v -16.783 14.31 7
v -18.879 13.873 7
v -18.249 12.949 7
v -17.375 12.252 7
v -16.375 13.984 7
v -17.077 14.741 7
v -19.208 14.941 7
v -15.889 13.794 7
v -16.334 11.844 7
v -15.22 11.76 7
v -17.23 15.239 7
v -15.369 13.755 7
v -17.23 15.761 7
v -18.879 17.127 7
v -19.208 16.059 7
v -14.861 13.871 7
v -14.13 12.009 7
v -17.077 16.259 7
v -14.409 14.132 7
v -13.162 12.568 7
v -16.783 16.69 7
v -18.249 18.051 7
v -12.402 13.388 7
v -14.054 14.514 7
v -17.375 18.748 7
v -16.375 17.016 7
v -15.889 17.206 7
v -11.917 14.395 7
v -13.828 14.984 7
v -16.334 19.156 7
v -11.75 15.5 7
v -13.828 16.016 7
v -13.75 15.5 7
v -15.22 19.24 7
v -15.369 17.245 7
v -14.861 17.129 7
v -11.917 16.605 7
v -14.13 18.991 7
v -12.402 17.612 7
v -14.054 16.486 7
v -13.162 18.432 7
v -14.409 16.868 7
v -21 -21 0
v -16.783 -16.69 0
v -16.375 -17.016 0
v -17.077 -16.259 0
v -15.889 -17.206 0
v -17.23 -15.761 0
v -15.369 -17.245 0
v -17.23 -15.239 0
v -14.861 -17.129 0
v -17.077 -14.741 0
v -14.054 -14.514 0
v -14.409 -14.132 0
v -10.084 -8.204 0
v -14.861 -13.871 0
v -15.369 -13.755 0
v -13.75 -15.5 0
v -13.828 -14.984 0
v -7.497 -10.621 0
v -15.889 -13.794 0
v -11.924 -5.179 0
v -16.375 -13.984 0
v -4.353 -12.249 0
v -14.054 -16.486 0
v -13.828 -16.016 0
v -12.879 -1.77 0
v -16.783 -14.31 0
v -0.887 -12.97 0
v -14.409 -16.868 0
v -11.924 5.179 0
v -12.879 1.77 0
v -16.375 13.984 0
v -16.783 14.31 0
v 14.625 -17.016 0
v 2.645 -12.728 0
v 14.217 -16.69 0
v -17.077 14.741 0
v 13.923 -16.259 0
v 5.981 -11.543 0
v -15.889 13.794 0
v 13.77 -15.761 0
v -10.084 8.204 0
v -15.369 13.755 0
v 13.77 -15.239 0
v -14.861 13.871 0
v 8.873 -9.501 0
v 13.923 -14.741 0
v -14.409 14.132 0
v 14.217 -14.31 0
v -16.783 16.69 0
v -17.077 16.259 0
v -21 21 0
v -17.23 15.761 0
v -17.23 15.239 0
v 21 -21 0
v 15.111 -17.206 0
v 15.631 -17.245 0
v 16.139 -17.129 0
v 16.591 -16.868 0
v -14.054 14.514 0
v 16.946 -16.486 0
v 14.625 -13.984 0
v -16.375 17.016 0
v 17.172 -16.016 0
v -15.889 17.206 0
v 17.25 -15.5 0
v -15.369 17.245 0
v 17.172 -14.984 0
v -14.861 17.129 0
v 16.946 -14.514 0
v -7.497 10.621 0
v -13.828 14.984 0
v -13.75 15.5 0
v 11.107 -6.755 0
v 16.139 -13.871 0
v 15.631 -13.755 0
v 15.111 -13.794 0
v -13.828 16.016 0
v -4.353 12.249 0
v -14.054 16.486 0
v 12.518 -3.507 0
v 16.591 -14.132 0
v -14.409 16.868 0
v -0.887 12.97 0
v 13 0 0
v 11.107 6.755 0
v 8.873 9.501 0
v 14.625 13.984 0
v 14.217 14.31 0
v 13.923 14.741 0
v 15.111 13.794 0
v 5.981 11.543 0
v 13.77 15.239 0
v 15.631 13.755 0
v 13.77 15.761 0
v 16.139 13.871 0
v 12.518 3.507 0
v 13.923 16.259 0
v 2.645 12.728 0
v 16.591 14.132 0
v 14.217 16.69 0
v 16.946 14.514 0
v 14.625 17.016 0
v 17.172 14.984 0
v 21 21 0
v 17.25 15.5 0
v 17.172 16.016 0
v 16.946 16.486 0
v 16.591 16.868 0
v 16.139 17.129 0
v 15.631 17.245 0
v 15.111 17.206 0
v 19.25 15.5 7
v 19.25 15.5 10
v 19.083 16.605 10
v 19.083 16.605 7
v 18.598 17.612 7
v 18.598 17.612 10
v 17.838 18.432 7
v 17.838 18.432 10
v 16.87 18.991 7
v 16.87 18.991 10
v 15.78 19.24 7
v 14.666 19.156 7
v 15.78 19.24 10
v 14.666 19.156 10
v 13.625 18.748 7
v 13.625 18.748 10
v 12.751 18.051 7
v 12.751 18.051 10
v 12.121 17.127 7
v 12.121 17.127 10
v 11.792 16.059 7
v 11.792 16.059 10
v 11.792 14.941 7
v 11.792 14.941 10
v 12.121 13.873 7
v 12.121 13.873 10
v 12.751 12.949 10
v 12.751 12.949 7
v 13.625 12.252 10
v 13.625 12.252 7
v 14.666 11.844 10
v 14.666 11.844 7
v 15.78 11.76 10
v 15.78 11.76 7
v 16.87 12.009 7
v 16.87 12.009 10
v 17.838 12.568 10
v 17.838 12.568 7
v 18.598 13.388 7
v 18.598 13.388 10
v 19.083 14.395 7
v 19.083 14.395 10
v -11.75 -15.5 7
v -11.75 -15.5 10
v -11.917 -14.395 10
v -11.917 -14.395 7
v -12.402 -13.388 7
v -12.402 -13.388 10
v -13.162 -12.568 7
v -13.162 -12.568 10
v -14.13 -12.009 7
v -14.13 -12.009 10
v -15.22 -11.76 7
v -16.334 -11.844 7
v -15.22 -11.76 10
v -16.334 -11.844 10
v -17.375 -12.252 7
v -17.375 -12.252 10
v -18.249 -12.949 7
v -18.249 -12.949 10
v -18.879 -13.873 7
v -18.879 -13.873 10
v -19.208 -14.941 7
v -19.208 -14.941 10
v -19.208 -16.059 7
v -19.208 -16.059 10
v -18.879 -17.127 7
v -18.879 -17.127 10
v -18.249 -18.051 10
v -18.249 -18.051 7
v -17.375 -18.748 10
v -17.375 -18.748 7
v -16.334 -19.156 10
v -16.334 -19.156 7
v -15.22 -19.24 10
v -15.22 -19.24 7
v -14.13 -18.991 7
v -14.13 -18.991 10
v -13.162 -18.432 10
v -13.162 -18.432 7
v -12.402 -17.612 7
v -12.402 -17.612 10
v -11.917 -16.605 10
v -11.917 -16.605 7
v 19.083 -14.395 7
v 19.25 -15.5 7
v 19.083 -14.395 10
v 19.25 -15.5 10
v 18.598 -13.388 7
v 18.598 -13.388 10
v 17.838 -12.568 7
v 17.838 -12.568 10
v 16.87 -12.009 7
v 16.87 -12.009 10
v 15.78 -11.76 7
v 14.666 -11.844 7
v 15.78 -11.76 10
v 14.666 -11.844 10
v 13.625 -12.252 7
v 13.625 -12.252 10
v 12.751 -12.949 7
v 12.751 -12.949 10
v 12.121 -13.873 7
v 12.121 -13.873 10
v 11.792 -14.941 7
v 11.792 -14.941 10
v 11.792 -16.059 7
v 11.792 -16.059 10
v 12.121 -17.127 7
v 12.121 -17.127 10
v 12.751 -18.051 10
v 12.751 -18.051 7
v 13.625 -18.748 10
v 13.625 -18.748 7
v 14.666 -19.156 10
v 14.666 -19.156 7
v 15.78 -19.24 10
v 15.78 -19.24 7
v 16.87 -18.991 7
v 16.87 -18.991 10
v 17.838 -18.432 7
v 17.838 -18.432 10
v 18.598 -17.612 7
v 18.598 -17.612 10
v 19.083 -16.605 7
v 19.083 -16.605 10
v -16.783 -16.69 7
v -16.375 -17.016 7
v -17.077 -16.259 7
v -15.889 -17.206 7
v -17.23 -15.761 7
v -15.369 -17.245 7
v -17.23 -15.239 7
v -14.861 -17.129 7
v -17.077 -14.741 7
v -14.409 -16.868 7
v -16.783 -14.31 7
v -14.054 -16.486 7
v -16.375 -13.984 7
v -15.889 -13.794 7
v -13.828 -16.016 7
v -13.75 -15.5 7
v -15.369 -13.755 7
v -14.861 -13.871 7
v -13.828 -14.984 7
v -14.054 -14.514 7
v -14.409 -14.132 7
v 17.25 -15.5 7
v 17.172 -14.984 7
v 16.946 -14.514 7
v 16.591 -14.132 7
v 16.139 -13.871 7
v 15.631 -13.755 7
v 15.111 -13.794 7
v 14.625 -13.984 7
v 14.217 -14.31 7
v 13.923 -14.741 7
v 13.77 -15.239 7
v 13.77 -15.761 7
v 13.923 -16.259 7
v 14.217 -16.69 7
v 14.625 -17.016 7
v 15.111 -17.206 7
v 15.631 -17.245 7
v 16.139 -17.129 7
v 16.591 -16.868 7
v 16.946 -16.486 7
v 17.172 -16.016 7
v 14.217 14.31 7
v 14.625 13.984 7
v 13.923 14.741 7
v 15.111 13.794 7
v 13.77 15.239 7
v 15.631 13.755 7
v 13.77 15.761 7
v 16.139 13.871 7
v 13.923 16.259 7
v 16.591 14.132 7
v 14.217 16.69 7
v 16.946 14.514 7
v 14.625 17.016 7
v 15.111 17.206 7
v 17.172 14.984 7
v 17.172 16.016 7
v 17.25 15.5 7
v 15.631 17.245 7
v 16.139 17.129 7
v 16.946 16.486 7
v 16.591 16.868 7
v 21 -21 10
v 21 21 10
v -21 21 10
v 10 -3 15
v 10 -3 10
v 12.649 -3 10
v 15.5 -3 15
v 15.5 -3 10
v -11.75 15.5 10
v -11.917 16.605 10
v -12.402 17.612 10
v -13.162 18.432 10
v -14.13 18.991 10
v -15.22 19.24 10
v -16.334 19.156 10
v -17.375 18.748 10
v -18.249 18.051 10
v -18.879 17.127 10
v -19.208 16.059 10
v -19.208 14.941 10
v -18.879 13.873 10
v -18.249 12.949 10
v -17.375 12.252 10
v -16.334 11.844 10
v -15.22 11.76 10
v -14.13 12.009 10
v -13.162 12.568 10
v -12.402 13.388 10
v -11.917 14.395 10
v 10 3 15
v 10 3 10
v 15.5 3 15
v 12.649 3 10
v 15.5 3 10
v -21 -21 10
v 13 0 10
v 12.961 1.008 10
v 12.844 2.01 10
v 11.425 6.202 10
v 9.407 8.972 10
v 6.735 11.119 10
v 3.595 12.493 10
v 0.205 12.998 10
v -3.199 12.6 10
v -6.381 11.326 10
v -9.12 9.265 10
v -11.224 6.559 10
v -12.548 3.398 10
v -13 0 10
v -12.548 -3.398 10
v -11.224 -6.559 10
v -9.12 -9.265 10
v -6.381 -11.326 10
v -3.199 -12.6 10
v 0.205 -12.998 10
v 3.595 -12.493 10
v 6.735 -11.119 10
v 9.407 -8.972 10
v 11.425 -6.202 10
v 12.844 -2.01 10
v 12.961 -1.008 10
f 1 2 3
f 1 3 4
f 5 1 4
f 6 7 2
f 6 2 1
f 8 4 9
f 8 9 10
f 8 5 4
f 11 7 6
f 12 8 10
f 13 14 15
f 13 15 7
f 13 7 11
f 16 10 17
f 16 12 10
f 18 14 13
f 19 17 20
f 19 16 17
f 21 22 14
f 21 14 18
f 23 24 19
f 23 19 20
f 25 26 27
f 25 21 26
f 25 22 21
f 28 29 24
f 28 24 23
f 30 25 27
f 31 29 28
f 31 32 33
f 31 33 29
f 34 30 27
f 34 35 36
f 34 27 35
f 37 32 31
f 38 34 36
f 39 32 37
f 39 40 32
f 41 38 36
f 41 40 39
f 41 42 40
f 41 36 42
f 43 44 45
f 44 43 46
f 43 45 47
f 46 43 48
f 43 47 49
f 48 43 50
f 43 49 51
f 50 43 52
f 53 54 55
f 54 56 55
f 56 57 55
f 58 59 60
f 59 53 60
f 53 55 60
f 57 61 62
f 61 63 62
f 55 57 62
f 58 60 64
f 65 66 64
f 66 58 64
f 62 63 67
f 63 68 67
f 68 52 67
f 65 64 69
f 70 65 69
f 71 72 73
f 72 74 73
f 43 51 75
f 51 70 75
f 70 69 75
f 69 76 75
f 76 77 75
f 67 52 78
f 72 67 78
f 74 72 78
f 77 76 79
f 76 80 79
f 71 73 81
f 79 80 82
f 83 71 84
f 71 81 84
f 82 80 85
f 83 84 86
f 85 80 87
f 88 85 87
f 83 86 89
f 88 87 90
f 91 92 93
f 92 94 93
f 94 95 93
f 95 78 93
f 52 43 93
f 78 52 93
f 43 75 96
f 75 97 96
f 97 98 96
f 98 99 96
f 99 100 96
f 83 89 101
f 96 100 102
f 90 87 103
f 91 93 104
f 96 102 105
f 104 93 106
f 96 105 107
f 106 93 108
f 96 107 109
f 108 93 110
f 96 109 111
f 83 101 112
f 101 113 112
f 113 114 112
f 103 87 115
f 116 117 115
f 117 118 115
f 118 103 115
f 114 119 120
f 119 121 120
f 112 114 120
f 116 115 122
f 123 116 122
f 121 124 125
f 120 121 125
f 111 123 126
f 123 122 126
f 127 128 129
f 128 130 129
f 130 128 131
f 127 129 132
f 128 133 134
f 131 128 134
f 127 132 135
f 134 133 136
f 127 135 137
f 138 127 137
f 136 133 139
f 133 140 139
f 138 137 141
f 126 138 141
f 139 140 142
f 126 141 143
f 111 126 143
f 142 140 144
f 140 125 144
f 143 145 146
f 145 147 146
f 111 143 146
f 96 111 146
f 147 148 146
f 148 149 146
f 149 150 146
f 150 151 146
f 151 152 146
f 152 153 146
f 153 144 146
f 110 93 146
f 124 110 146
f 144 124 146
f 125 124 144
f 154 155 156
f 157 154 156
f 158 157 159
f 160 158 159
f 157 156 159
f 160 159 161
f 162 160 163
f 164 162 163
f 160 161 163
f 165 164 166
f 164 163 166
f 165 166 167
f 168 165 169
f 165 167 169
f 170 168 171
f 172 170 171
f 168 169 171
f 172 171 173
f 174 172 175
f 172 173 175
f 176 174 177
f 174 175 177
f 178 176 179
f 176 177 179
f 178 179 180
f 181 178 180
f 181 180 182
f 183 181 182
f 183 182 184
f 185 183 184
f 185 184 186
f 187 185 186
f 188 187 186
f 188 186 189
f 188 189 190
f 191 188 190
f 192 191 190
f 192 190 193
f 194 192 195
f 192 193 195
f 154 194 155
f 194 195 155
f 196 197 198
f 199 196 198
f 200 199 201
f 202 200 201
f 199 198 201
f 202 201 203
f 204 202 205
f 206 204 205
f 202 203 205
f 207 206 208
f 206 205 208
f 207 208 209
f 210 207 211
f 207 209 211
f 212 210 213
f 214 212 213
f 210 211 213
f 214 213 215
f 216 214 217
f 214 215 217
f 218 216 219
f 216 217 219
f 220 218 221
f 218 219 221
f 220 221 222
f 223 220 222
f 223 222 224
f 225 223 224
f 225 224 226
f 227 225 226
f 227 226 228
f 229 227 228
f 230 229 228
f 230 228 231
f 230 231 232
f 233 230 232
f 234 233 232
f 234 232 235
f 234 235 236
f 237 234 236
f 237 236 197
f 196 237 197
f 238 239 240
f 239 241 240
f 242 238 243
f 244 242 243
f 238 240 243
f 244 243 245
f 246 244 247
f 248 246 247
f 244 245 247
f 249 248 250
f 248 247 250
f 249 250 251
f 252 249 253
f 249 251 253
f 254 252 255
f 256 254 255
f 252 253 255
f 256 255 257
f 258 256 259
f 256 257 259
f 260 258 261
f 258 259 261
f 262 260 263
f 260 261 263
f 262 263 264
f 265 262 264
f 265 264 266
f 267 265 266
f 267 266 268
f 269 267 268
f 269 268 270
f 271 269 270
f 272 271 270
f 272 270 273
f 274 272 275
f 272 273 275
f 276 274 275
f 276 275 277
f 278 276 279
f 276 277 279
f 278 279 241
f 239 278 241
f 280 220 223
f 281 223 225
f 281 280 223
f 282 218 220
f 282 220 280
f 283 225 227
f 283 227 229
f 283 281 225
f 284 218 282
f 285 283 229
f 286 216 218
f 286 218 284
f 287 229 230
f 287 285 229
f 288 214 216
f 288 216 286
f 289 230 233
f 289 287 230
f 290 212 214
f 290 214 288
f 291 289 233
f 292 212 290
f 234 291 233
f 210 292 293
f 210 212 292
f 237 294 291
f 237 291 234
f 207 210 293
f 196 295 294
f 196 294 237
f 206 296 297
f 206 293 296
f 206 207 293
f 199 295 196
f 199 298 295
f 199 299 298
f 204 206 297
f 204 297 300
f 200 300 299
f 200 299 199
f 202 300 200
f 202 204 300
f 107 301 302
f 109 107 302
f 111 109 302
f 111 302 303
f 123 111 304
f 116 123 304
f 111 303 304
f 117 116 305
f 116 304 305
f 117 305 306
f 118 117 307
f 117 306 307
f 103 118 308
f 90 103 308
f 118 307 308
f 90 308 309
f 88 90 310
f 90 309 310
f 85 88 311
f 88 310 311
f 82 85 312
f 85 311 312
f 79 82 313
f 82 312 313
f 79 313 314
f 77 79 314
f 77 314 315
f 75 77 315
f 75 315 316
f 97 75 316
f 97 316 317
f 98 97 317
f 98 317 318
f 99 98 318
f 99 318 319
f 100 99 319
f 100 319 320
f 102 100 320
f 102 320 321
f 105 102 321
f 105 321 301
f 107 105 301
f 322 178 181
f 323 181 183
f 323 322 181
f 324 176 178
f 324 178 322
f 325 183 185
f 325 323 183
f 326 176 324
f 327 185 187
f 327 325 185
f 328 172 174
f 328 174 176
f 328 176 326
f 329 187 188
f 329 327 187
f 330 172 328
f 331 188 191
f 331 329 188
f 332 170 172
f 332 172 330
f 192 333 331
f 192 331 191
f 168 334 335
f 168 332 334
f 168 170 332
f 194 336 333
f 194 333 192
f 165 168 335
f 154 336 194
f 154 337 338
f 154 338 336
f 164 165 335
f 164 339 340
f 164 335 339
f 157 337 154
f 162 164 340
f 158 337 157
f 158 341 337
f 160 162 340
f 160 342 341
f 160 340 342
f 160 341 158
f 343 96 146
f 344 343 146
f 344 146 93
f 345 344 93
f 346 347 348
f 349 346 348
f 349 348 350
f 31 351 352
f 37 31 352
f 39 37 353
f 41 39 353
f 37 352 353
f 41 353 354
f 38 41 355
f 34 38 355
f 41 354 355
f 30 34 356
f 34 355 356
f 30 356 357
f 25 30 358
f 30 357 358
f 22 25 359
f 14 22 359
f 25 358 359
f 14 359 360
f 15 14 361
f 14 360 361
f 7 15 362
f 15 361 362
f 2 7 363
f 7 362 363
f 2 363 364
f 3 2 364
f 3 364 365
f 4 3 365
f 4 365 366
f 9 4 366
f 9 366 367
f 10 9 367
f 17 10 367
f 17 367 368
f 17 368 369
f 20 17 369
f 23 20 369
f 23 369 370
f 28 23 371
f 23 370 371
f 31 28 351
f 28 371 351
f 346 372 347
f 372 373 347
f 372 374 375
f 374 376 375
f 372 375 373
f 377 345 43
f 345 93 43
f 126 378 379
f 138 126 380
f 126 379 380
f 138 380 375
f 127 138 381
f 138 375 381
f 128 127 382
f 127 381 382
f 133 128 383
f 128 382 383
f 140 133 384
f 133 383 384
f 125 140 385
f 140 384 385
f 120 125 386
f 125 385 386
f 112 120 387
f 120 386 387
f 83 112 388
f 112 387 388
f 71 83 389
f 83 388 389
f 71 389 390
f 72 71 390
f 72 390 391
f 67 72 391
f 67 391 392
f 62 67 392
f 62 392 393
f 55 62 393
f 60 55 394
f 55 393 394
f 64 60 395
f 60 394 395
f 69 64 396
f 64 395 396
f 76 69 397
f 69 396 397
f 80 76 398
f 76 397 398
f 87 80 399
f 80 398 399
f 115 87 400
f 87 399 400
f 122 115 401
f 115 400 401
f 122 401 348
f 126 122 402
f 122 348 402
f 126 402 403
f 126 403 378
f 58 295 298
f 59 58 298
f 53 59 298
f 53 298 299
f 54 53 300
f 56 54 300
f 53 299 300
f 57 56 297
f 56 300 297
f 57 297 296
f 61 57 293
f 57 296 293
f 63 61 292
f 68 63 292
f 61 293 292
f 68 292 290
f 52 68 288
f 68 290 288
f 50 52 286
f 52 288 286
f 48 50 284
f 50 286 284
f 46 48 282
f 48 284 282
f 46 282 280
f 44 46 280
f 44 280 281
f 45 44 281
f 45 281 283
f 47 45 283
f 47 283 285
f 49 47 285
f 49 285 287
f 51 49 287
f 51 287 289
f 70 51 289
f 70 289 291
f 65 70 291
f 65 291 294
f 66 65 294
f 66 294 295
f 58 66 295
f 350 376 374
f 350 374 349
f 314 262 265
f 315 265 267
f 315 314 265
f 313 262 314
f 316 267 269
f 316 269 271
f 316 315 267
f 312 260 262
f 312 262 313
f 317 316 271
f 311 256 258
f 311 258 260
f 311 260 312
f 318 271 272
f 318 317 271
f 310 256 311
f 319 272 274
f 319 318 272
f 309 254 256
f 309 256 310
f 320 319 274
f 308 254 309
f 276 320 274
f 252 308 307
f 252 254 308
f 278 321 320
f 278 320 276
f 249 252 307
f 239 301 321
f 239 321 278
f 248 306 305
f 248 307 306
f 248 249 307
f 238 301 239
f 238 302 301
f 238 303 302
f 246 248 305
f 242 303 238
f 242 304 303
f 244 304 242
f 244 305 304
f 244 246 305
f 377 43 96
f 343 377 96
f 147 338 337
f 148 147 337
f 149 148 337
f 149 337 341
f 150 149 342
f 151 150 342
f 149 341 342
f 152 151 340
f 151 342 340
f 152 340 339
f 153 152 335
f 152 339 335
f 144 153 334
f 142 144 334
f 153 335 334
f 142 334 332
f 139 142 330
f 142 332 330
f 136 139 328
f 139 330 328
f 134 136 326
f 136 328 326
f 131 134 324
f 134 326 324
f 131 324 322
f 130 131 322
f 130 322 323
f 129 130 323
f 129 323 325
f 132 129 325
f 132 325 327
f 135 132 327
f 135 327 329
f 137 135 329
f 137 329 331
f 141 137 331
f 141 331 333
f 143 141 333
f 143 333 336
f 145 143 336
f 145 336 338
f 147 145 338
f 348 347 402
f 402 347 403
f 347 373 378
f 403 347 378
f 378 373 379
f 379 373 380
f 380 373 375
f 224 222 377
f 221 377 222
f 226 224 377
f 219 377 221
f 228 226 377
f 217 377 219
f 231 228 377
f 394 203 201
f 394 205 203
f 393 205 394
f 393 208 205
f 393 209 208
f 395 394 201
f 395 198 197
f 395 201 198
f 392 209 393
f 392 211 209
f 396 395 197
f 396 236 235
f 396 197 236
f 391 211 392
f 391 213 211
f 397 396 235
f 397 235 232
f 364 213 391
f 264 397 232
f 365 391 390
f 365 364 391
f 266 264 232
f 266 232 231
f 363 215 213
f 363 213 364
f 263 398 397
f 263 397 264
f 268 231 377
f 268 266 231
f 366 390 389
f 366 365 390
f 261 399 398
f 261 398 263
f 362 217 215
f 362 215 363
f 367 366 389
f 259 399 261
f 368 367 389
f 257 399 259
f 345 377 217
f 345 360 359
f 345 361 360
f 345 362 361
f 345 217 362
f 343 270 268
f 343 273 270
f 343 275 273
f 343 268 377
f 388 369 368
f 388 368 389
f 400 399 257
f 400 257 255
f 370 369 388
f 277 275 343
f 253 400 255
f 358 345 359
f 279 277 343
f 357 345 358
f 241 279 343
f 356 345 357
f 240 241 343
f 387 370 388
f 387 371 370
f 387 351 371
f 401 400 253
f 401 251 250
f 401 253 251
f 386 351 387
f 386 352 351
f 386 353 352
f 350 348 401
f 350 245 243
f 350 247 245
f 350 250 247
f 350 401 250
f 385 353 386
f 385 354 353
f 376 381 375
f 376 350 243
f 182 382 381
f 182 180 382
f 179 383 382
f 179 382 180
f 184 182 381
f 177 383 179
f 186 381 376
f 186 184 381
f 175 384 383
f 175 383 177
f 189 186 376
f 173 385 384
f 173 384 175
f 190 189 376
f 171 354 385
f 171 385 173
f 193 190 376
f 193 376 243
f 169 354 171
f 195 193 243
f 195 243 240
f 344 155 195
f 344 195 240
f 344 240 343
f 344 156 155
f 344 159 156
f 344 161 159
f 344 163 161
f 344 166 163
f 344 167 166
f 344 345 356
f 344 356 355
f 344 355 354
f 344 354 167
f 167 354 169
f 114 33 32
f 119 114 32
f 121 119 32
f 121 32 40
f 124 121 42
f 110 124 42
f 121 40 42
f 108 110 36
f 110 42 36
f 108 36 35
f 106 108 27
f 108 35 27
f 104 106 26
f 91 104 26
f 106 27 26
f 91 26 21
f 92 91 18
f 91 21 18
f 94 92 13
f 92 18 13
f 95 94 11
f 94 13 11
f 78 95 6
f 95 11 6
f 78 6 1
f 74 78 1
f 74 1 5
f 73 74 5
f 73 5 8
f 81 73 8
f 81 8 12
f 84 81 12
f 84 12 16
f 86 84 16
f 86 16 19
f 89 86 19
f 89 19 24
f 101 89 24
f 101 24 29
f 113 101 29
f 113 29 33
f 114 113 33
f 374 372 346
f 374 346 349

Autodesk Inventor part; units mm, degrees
ref_plane "YZ Plane" through (0, 0, 0) normal (1, 0, 0) x (0, 1, 0)
ref_plane "XZ Plane" through (0, 0, 0) normal (0, 1, 0) x (-1, 0, 0)
ref_plane "XY Plane" through (0, 0, 0) normal (0, 0, 1) x (1, 0, 0)
sketch "Sketch1" plane through (0, 0, 0) normal (0, 0, 1) x (1, 0, 0)
  line L0 (-21, -21) -> (21, -21)
  line L1 (21, -21) -> (21, 21)
  line L2 (21, 21) -> (-21, 21)
  line L3 (-21, 21) -> (-21, -21)
  line L4 (-21, 0) -> (21, 0)
  line L5 (21, 0) -> (19, 0)
  line L6 (0, -21) -> (0, 21)
  point P0 (0, 0)
  point P1 (0, 0)
  dimension "d0" = 42
  dimension "d1" = 42
extrude "Extrusion1" add sketch "Sketch1" along normal blind 10
sketch "Sketch2" plane through (0, 0, 10) normal (0, 0, 1) x (1, 0, 0)
  circle A0 centre (0, 0) radius 13
  circle A1 centre (-15.5, 15.5) radius 1.75
  circle A2 centre (15.5, 15.5) radius 1.75
  circle A3 centre (15.5, -15.5) radius 1.75
  circle A4 centre (-15.5, -15.5) radius 1.75
  line L0 (21, 21) -> (-21, 21) projected
  line L1 (-21, 21) -> (-21, -21) projected
  line L2 (-21, -21) -> (21, -21) projected
  line L3 (21, -21) -> (21, 21) projected
  line L4 (0, -21) -> (0, 21)
  line L5 (-21, 0) -> (21, 0)
  dimension "d5" = 26
  dimension "d6" = 3.5
  dimension "d7" = 31
  dimension "d8" = 31
extrude "Extrusion2" cut sketch "Sketch2" against normal through all contours L5 L4 A0 | A0 L4 L5 | L4 L5 A0 | A0 L5 L4 | A1 | A2 | A3 | A4
sketch "Sketch3" plane through (0, 0, 10) normal (0, 0, 1) x (1, 0, 0)
  circle A0 centre (15.5, -15.5) radius 1.75 projected
  circle A1 centre (-15.5, -15.5) radius 1.75 projected
  circle A2 centre (0, 0) radius 13 projected
  circle A3 centre (-15.5, 15.5) radius 1.75 projected
  circle A4 centre (15.5, 15.5) radius 1.75 projected
  line L0 (-21, 21) -> (-21, -21) projected
  line L1 (-21, -21) -> (21, -21) projected
  line L2 (21, -21) -> (21, 21) projected
  line L3 (21, 21) -> (-21, 21) projected
  circle A5 centre (15.5, -15.5) radius 3.75
  circle A6 centre (-15.5, -15.5) radius 3.75
  circle A7 centre (-15.5, 15.5) radius 3.75
  circle A8 centre (15.5, 15.5) radius 3.75
  dimension "d14" = 2
  dimension "d17" = 2
  dimension "d18" = 2
  dimension "d19" = 2
extrude "Extrusion4" cut sketch "Sketch3" against normal blind 3 contours A5 | A6 | A7 | A8
sketch "Sketch5" plane through (0, 0, 10) normal (0, 0, 1) x (1, 0, 0)
  circle A0 centre (-15.5, 15.5) radius 3.75 projected
  circle A1 centre (15.5, -15.5) radius 3.75 projected
  circle A2 centre (-15.5, -15.5) radius 3.75 projected
  circle A3 centre (15.5, 15.5) radius 3.75 projected
  circle A4 centre (0, 0) radius 13 projected
  line L0 (21, 21) -> (-21, 21) projected
  line L1 (-21, 21) -> (-21, -21) projected
  line L2 (-21, -21) -> (21, -21) projected
  line L3 (21, -21) -> (21, 21) projected
  line L4 (21, -21) -> (21, 21) projected
  line L5 (21, 0) -> (13, 0)
  line L6 (15.5, 3) -> (15.5, -3)
  line L7 (15.5, 3) -> (10, 3)
  line L8 (10, 3) -> (10, -3)
  line L9 (10, -3) -> (15.5, -3)
  dimension "d27" = 6
extrude "Extrusion5" add sketch "Sketch5" along normal blind 5 contours A4 L9 L8 L7 | L5 L6 L9 A4 | A4 L7 L6 L5 picked at (11, 0)
properties part number "soporte02"
